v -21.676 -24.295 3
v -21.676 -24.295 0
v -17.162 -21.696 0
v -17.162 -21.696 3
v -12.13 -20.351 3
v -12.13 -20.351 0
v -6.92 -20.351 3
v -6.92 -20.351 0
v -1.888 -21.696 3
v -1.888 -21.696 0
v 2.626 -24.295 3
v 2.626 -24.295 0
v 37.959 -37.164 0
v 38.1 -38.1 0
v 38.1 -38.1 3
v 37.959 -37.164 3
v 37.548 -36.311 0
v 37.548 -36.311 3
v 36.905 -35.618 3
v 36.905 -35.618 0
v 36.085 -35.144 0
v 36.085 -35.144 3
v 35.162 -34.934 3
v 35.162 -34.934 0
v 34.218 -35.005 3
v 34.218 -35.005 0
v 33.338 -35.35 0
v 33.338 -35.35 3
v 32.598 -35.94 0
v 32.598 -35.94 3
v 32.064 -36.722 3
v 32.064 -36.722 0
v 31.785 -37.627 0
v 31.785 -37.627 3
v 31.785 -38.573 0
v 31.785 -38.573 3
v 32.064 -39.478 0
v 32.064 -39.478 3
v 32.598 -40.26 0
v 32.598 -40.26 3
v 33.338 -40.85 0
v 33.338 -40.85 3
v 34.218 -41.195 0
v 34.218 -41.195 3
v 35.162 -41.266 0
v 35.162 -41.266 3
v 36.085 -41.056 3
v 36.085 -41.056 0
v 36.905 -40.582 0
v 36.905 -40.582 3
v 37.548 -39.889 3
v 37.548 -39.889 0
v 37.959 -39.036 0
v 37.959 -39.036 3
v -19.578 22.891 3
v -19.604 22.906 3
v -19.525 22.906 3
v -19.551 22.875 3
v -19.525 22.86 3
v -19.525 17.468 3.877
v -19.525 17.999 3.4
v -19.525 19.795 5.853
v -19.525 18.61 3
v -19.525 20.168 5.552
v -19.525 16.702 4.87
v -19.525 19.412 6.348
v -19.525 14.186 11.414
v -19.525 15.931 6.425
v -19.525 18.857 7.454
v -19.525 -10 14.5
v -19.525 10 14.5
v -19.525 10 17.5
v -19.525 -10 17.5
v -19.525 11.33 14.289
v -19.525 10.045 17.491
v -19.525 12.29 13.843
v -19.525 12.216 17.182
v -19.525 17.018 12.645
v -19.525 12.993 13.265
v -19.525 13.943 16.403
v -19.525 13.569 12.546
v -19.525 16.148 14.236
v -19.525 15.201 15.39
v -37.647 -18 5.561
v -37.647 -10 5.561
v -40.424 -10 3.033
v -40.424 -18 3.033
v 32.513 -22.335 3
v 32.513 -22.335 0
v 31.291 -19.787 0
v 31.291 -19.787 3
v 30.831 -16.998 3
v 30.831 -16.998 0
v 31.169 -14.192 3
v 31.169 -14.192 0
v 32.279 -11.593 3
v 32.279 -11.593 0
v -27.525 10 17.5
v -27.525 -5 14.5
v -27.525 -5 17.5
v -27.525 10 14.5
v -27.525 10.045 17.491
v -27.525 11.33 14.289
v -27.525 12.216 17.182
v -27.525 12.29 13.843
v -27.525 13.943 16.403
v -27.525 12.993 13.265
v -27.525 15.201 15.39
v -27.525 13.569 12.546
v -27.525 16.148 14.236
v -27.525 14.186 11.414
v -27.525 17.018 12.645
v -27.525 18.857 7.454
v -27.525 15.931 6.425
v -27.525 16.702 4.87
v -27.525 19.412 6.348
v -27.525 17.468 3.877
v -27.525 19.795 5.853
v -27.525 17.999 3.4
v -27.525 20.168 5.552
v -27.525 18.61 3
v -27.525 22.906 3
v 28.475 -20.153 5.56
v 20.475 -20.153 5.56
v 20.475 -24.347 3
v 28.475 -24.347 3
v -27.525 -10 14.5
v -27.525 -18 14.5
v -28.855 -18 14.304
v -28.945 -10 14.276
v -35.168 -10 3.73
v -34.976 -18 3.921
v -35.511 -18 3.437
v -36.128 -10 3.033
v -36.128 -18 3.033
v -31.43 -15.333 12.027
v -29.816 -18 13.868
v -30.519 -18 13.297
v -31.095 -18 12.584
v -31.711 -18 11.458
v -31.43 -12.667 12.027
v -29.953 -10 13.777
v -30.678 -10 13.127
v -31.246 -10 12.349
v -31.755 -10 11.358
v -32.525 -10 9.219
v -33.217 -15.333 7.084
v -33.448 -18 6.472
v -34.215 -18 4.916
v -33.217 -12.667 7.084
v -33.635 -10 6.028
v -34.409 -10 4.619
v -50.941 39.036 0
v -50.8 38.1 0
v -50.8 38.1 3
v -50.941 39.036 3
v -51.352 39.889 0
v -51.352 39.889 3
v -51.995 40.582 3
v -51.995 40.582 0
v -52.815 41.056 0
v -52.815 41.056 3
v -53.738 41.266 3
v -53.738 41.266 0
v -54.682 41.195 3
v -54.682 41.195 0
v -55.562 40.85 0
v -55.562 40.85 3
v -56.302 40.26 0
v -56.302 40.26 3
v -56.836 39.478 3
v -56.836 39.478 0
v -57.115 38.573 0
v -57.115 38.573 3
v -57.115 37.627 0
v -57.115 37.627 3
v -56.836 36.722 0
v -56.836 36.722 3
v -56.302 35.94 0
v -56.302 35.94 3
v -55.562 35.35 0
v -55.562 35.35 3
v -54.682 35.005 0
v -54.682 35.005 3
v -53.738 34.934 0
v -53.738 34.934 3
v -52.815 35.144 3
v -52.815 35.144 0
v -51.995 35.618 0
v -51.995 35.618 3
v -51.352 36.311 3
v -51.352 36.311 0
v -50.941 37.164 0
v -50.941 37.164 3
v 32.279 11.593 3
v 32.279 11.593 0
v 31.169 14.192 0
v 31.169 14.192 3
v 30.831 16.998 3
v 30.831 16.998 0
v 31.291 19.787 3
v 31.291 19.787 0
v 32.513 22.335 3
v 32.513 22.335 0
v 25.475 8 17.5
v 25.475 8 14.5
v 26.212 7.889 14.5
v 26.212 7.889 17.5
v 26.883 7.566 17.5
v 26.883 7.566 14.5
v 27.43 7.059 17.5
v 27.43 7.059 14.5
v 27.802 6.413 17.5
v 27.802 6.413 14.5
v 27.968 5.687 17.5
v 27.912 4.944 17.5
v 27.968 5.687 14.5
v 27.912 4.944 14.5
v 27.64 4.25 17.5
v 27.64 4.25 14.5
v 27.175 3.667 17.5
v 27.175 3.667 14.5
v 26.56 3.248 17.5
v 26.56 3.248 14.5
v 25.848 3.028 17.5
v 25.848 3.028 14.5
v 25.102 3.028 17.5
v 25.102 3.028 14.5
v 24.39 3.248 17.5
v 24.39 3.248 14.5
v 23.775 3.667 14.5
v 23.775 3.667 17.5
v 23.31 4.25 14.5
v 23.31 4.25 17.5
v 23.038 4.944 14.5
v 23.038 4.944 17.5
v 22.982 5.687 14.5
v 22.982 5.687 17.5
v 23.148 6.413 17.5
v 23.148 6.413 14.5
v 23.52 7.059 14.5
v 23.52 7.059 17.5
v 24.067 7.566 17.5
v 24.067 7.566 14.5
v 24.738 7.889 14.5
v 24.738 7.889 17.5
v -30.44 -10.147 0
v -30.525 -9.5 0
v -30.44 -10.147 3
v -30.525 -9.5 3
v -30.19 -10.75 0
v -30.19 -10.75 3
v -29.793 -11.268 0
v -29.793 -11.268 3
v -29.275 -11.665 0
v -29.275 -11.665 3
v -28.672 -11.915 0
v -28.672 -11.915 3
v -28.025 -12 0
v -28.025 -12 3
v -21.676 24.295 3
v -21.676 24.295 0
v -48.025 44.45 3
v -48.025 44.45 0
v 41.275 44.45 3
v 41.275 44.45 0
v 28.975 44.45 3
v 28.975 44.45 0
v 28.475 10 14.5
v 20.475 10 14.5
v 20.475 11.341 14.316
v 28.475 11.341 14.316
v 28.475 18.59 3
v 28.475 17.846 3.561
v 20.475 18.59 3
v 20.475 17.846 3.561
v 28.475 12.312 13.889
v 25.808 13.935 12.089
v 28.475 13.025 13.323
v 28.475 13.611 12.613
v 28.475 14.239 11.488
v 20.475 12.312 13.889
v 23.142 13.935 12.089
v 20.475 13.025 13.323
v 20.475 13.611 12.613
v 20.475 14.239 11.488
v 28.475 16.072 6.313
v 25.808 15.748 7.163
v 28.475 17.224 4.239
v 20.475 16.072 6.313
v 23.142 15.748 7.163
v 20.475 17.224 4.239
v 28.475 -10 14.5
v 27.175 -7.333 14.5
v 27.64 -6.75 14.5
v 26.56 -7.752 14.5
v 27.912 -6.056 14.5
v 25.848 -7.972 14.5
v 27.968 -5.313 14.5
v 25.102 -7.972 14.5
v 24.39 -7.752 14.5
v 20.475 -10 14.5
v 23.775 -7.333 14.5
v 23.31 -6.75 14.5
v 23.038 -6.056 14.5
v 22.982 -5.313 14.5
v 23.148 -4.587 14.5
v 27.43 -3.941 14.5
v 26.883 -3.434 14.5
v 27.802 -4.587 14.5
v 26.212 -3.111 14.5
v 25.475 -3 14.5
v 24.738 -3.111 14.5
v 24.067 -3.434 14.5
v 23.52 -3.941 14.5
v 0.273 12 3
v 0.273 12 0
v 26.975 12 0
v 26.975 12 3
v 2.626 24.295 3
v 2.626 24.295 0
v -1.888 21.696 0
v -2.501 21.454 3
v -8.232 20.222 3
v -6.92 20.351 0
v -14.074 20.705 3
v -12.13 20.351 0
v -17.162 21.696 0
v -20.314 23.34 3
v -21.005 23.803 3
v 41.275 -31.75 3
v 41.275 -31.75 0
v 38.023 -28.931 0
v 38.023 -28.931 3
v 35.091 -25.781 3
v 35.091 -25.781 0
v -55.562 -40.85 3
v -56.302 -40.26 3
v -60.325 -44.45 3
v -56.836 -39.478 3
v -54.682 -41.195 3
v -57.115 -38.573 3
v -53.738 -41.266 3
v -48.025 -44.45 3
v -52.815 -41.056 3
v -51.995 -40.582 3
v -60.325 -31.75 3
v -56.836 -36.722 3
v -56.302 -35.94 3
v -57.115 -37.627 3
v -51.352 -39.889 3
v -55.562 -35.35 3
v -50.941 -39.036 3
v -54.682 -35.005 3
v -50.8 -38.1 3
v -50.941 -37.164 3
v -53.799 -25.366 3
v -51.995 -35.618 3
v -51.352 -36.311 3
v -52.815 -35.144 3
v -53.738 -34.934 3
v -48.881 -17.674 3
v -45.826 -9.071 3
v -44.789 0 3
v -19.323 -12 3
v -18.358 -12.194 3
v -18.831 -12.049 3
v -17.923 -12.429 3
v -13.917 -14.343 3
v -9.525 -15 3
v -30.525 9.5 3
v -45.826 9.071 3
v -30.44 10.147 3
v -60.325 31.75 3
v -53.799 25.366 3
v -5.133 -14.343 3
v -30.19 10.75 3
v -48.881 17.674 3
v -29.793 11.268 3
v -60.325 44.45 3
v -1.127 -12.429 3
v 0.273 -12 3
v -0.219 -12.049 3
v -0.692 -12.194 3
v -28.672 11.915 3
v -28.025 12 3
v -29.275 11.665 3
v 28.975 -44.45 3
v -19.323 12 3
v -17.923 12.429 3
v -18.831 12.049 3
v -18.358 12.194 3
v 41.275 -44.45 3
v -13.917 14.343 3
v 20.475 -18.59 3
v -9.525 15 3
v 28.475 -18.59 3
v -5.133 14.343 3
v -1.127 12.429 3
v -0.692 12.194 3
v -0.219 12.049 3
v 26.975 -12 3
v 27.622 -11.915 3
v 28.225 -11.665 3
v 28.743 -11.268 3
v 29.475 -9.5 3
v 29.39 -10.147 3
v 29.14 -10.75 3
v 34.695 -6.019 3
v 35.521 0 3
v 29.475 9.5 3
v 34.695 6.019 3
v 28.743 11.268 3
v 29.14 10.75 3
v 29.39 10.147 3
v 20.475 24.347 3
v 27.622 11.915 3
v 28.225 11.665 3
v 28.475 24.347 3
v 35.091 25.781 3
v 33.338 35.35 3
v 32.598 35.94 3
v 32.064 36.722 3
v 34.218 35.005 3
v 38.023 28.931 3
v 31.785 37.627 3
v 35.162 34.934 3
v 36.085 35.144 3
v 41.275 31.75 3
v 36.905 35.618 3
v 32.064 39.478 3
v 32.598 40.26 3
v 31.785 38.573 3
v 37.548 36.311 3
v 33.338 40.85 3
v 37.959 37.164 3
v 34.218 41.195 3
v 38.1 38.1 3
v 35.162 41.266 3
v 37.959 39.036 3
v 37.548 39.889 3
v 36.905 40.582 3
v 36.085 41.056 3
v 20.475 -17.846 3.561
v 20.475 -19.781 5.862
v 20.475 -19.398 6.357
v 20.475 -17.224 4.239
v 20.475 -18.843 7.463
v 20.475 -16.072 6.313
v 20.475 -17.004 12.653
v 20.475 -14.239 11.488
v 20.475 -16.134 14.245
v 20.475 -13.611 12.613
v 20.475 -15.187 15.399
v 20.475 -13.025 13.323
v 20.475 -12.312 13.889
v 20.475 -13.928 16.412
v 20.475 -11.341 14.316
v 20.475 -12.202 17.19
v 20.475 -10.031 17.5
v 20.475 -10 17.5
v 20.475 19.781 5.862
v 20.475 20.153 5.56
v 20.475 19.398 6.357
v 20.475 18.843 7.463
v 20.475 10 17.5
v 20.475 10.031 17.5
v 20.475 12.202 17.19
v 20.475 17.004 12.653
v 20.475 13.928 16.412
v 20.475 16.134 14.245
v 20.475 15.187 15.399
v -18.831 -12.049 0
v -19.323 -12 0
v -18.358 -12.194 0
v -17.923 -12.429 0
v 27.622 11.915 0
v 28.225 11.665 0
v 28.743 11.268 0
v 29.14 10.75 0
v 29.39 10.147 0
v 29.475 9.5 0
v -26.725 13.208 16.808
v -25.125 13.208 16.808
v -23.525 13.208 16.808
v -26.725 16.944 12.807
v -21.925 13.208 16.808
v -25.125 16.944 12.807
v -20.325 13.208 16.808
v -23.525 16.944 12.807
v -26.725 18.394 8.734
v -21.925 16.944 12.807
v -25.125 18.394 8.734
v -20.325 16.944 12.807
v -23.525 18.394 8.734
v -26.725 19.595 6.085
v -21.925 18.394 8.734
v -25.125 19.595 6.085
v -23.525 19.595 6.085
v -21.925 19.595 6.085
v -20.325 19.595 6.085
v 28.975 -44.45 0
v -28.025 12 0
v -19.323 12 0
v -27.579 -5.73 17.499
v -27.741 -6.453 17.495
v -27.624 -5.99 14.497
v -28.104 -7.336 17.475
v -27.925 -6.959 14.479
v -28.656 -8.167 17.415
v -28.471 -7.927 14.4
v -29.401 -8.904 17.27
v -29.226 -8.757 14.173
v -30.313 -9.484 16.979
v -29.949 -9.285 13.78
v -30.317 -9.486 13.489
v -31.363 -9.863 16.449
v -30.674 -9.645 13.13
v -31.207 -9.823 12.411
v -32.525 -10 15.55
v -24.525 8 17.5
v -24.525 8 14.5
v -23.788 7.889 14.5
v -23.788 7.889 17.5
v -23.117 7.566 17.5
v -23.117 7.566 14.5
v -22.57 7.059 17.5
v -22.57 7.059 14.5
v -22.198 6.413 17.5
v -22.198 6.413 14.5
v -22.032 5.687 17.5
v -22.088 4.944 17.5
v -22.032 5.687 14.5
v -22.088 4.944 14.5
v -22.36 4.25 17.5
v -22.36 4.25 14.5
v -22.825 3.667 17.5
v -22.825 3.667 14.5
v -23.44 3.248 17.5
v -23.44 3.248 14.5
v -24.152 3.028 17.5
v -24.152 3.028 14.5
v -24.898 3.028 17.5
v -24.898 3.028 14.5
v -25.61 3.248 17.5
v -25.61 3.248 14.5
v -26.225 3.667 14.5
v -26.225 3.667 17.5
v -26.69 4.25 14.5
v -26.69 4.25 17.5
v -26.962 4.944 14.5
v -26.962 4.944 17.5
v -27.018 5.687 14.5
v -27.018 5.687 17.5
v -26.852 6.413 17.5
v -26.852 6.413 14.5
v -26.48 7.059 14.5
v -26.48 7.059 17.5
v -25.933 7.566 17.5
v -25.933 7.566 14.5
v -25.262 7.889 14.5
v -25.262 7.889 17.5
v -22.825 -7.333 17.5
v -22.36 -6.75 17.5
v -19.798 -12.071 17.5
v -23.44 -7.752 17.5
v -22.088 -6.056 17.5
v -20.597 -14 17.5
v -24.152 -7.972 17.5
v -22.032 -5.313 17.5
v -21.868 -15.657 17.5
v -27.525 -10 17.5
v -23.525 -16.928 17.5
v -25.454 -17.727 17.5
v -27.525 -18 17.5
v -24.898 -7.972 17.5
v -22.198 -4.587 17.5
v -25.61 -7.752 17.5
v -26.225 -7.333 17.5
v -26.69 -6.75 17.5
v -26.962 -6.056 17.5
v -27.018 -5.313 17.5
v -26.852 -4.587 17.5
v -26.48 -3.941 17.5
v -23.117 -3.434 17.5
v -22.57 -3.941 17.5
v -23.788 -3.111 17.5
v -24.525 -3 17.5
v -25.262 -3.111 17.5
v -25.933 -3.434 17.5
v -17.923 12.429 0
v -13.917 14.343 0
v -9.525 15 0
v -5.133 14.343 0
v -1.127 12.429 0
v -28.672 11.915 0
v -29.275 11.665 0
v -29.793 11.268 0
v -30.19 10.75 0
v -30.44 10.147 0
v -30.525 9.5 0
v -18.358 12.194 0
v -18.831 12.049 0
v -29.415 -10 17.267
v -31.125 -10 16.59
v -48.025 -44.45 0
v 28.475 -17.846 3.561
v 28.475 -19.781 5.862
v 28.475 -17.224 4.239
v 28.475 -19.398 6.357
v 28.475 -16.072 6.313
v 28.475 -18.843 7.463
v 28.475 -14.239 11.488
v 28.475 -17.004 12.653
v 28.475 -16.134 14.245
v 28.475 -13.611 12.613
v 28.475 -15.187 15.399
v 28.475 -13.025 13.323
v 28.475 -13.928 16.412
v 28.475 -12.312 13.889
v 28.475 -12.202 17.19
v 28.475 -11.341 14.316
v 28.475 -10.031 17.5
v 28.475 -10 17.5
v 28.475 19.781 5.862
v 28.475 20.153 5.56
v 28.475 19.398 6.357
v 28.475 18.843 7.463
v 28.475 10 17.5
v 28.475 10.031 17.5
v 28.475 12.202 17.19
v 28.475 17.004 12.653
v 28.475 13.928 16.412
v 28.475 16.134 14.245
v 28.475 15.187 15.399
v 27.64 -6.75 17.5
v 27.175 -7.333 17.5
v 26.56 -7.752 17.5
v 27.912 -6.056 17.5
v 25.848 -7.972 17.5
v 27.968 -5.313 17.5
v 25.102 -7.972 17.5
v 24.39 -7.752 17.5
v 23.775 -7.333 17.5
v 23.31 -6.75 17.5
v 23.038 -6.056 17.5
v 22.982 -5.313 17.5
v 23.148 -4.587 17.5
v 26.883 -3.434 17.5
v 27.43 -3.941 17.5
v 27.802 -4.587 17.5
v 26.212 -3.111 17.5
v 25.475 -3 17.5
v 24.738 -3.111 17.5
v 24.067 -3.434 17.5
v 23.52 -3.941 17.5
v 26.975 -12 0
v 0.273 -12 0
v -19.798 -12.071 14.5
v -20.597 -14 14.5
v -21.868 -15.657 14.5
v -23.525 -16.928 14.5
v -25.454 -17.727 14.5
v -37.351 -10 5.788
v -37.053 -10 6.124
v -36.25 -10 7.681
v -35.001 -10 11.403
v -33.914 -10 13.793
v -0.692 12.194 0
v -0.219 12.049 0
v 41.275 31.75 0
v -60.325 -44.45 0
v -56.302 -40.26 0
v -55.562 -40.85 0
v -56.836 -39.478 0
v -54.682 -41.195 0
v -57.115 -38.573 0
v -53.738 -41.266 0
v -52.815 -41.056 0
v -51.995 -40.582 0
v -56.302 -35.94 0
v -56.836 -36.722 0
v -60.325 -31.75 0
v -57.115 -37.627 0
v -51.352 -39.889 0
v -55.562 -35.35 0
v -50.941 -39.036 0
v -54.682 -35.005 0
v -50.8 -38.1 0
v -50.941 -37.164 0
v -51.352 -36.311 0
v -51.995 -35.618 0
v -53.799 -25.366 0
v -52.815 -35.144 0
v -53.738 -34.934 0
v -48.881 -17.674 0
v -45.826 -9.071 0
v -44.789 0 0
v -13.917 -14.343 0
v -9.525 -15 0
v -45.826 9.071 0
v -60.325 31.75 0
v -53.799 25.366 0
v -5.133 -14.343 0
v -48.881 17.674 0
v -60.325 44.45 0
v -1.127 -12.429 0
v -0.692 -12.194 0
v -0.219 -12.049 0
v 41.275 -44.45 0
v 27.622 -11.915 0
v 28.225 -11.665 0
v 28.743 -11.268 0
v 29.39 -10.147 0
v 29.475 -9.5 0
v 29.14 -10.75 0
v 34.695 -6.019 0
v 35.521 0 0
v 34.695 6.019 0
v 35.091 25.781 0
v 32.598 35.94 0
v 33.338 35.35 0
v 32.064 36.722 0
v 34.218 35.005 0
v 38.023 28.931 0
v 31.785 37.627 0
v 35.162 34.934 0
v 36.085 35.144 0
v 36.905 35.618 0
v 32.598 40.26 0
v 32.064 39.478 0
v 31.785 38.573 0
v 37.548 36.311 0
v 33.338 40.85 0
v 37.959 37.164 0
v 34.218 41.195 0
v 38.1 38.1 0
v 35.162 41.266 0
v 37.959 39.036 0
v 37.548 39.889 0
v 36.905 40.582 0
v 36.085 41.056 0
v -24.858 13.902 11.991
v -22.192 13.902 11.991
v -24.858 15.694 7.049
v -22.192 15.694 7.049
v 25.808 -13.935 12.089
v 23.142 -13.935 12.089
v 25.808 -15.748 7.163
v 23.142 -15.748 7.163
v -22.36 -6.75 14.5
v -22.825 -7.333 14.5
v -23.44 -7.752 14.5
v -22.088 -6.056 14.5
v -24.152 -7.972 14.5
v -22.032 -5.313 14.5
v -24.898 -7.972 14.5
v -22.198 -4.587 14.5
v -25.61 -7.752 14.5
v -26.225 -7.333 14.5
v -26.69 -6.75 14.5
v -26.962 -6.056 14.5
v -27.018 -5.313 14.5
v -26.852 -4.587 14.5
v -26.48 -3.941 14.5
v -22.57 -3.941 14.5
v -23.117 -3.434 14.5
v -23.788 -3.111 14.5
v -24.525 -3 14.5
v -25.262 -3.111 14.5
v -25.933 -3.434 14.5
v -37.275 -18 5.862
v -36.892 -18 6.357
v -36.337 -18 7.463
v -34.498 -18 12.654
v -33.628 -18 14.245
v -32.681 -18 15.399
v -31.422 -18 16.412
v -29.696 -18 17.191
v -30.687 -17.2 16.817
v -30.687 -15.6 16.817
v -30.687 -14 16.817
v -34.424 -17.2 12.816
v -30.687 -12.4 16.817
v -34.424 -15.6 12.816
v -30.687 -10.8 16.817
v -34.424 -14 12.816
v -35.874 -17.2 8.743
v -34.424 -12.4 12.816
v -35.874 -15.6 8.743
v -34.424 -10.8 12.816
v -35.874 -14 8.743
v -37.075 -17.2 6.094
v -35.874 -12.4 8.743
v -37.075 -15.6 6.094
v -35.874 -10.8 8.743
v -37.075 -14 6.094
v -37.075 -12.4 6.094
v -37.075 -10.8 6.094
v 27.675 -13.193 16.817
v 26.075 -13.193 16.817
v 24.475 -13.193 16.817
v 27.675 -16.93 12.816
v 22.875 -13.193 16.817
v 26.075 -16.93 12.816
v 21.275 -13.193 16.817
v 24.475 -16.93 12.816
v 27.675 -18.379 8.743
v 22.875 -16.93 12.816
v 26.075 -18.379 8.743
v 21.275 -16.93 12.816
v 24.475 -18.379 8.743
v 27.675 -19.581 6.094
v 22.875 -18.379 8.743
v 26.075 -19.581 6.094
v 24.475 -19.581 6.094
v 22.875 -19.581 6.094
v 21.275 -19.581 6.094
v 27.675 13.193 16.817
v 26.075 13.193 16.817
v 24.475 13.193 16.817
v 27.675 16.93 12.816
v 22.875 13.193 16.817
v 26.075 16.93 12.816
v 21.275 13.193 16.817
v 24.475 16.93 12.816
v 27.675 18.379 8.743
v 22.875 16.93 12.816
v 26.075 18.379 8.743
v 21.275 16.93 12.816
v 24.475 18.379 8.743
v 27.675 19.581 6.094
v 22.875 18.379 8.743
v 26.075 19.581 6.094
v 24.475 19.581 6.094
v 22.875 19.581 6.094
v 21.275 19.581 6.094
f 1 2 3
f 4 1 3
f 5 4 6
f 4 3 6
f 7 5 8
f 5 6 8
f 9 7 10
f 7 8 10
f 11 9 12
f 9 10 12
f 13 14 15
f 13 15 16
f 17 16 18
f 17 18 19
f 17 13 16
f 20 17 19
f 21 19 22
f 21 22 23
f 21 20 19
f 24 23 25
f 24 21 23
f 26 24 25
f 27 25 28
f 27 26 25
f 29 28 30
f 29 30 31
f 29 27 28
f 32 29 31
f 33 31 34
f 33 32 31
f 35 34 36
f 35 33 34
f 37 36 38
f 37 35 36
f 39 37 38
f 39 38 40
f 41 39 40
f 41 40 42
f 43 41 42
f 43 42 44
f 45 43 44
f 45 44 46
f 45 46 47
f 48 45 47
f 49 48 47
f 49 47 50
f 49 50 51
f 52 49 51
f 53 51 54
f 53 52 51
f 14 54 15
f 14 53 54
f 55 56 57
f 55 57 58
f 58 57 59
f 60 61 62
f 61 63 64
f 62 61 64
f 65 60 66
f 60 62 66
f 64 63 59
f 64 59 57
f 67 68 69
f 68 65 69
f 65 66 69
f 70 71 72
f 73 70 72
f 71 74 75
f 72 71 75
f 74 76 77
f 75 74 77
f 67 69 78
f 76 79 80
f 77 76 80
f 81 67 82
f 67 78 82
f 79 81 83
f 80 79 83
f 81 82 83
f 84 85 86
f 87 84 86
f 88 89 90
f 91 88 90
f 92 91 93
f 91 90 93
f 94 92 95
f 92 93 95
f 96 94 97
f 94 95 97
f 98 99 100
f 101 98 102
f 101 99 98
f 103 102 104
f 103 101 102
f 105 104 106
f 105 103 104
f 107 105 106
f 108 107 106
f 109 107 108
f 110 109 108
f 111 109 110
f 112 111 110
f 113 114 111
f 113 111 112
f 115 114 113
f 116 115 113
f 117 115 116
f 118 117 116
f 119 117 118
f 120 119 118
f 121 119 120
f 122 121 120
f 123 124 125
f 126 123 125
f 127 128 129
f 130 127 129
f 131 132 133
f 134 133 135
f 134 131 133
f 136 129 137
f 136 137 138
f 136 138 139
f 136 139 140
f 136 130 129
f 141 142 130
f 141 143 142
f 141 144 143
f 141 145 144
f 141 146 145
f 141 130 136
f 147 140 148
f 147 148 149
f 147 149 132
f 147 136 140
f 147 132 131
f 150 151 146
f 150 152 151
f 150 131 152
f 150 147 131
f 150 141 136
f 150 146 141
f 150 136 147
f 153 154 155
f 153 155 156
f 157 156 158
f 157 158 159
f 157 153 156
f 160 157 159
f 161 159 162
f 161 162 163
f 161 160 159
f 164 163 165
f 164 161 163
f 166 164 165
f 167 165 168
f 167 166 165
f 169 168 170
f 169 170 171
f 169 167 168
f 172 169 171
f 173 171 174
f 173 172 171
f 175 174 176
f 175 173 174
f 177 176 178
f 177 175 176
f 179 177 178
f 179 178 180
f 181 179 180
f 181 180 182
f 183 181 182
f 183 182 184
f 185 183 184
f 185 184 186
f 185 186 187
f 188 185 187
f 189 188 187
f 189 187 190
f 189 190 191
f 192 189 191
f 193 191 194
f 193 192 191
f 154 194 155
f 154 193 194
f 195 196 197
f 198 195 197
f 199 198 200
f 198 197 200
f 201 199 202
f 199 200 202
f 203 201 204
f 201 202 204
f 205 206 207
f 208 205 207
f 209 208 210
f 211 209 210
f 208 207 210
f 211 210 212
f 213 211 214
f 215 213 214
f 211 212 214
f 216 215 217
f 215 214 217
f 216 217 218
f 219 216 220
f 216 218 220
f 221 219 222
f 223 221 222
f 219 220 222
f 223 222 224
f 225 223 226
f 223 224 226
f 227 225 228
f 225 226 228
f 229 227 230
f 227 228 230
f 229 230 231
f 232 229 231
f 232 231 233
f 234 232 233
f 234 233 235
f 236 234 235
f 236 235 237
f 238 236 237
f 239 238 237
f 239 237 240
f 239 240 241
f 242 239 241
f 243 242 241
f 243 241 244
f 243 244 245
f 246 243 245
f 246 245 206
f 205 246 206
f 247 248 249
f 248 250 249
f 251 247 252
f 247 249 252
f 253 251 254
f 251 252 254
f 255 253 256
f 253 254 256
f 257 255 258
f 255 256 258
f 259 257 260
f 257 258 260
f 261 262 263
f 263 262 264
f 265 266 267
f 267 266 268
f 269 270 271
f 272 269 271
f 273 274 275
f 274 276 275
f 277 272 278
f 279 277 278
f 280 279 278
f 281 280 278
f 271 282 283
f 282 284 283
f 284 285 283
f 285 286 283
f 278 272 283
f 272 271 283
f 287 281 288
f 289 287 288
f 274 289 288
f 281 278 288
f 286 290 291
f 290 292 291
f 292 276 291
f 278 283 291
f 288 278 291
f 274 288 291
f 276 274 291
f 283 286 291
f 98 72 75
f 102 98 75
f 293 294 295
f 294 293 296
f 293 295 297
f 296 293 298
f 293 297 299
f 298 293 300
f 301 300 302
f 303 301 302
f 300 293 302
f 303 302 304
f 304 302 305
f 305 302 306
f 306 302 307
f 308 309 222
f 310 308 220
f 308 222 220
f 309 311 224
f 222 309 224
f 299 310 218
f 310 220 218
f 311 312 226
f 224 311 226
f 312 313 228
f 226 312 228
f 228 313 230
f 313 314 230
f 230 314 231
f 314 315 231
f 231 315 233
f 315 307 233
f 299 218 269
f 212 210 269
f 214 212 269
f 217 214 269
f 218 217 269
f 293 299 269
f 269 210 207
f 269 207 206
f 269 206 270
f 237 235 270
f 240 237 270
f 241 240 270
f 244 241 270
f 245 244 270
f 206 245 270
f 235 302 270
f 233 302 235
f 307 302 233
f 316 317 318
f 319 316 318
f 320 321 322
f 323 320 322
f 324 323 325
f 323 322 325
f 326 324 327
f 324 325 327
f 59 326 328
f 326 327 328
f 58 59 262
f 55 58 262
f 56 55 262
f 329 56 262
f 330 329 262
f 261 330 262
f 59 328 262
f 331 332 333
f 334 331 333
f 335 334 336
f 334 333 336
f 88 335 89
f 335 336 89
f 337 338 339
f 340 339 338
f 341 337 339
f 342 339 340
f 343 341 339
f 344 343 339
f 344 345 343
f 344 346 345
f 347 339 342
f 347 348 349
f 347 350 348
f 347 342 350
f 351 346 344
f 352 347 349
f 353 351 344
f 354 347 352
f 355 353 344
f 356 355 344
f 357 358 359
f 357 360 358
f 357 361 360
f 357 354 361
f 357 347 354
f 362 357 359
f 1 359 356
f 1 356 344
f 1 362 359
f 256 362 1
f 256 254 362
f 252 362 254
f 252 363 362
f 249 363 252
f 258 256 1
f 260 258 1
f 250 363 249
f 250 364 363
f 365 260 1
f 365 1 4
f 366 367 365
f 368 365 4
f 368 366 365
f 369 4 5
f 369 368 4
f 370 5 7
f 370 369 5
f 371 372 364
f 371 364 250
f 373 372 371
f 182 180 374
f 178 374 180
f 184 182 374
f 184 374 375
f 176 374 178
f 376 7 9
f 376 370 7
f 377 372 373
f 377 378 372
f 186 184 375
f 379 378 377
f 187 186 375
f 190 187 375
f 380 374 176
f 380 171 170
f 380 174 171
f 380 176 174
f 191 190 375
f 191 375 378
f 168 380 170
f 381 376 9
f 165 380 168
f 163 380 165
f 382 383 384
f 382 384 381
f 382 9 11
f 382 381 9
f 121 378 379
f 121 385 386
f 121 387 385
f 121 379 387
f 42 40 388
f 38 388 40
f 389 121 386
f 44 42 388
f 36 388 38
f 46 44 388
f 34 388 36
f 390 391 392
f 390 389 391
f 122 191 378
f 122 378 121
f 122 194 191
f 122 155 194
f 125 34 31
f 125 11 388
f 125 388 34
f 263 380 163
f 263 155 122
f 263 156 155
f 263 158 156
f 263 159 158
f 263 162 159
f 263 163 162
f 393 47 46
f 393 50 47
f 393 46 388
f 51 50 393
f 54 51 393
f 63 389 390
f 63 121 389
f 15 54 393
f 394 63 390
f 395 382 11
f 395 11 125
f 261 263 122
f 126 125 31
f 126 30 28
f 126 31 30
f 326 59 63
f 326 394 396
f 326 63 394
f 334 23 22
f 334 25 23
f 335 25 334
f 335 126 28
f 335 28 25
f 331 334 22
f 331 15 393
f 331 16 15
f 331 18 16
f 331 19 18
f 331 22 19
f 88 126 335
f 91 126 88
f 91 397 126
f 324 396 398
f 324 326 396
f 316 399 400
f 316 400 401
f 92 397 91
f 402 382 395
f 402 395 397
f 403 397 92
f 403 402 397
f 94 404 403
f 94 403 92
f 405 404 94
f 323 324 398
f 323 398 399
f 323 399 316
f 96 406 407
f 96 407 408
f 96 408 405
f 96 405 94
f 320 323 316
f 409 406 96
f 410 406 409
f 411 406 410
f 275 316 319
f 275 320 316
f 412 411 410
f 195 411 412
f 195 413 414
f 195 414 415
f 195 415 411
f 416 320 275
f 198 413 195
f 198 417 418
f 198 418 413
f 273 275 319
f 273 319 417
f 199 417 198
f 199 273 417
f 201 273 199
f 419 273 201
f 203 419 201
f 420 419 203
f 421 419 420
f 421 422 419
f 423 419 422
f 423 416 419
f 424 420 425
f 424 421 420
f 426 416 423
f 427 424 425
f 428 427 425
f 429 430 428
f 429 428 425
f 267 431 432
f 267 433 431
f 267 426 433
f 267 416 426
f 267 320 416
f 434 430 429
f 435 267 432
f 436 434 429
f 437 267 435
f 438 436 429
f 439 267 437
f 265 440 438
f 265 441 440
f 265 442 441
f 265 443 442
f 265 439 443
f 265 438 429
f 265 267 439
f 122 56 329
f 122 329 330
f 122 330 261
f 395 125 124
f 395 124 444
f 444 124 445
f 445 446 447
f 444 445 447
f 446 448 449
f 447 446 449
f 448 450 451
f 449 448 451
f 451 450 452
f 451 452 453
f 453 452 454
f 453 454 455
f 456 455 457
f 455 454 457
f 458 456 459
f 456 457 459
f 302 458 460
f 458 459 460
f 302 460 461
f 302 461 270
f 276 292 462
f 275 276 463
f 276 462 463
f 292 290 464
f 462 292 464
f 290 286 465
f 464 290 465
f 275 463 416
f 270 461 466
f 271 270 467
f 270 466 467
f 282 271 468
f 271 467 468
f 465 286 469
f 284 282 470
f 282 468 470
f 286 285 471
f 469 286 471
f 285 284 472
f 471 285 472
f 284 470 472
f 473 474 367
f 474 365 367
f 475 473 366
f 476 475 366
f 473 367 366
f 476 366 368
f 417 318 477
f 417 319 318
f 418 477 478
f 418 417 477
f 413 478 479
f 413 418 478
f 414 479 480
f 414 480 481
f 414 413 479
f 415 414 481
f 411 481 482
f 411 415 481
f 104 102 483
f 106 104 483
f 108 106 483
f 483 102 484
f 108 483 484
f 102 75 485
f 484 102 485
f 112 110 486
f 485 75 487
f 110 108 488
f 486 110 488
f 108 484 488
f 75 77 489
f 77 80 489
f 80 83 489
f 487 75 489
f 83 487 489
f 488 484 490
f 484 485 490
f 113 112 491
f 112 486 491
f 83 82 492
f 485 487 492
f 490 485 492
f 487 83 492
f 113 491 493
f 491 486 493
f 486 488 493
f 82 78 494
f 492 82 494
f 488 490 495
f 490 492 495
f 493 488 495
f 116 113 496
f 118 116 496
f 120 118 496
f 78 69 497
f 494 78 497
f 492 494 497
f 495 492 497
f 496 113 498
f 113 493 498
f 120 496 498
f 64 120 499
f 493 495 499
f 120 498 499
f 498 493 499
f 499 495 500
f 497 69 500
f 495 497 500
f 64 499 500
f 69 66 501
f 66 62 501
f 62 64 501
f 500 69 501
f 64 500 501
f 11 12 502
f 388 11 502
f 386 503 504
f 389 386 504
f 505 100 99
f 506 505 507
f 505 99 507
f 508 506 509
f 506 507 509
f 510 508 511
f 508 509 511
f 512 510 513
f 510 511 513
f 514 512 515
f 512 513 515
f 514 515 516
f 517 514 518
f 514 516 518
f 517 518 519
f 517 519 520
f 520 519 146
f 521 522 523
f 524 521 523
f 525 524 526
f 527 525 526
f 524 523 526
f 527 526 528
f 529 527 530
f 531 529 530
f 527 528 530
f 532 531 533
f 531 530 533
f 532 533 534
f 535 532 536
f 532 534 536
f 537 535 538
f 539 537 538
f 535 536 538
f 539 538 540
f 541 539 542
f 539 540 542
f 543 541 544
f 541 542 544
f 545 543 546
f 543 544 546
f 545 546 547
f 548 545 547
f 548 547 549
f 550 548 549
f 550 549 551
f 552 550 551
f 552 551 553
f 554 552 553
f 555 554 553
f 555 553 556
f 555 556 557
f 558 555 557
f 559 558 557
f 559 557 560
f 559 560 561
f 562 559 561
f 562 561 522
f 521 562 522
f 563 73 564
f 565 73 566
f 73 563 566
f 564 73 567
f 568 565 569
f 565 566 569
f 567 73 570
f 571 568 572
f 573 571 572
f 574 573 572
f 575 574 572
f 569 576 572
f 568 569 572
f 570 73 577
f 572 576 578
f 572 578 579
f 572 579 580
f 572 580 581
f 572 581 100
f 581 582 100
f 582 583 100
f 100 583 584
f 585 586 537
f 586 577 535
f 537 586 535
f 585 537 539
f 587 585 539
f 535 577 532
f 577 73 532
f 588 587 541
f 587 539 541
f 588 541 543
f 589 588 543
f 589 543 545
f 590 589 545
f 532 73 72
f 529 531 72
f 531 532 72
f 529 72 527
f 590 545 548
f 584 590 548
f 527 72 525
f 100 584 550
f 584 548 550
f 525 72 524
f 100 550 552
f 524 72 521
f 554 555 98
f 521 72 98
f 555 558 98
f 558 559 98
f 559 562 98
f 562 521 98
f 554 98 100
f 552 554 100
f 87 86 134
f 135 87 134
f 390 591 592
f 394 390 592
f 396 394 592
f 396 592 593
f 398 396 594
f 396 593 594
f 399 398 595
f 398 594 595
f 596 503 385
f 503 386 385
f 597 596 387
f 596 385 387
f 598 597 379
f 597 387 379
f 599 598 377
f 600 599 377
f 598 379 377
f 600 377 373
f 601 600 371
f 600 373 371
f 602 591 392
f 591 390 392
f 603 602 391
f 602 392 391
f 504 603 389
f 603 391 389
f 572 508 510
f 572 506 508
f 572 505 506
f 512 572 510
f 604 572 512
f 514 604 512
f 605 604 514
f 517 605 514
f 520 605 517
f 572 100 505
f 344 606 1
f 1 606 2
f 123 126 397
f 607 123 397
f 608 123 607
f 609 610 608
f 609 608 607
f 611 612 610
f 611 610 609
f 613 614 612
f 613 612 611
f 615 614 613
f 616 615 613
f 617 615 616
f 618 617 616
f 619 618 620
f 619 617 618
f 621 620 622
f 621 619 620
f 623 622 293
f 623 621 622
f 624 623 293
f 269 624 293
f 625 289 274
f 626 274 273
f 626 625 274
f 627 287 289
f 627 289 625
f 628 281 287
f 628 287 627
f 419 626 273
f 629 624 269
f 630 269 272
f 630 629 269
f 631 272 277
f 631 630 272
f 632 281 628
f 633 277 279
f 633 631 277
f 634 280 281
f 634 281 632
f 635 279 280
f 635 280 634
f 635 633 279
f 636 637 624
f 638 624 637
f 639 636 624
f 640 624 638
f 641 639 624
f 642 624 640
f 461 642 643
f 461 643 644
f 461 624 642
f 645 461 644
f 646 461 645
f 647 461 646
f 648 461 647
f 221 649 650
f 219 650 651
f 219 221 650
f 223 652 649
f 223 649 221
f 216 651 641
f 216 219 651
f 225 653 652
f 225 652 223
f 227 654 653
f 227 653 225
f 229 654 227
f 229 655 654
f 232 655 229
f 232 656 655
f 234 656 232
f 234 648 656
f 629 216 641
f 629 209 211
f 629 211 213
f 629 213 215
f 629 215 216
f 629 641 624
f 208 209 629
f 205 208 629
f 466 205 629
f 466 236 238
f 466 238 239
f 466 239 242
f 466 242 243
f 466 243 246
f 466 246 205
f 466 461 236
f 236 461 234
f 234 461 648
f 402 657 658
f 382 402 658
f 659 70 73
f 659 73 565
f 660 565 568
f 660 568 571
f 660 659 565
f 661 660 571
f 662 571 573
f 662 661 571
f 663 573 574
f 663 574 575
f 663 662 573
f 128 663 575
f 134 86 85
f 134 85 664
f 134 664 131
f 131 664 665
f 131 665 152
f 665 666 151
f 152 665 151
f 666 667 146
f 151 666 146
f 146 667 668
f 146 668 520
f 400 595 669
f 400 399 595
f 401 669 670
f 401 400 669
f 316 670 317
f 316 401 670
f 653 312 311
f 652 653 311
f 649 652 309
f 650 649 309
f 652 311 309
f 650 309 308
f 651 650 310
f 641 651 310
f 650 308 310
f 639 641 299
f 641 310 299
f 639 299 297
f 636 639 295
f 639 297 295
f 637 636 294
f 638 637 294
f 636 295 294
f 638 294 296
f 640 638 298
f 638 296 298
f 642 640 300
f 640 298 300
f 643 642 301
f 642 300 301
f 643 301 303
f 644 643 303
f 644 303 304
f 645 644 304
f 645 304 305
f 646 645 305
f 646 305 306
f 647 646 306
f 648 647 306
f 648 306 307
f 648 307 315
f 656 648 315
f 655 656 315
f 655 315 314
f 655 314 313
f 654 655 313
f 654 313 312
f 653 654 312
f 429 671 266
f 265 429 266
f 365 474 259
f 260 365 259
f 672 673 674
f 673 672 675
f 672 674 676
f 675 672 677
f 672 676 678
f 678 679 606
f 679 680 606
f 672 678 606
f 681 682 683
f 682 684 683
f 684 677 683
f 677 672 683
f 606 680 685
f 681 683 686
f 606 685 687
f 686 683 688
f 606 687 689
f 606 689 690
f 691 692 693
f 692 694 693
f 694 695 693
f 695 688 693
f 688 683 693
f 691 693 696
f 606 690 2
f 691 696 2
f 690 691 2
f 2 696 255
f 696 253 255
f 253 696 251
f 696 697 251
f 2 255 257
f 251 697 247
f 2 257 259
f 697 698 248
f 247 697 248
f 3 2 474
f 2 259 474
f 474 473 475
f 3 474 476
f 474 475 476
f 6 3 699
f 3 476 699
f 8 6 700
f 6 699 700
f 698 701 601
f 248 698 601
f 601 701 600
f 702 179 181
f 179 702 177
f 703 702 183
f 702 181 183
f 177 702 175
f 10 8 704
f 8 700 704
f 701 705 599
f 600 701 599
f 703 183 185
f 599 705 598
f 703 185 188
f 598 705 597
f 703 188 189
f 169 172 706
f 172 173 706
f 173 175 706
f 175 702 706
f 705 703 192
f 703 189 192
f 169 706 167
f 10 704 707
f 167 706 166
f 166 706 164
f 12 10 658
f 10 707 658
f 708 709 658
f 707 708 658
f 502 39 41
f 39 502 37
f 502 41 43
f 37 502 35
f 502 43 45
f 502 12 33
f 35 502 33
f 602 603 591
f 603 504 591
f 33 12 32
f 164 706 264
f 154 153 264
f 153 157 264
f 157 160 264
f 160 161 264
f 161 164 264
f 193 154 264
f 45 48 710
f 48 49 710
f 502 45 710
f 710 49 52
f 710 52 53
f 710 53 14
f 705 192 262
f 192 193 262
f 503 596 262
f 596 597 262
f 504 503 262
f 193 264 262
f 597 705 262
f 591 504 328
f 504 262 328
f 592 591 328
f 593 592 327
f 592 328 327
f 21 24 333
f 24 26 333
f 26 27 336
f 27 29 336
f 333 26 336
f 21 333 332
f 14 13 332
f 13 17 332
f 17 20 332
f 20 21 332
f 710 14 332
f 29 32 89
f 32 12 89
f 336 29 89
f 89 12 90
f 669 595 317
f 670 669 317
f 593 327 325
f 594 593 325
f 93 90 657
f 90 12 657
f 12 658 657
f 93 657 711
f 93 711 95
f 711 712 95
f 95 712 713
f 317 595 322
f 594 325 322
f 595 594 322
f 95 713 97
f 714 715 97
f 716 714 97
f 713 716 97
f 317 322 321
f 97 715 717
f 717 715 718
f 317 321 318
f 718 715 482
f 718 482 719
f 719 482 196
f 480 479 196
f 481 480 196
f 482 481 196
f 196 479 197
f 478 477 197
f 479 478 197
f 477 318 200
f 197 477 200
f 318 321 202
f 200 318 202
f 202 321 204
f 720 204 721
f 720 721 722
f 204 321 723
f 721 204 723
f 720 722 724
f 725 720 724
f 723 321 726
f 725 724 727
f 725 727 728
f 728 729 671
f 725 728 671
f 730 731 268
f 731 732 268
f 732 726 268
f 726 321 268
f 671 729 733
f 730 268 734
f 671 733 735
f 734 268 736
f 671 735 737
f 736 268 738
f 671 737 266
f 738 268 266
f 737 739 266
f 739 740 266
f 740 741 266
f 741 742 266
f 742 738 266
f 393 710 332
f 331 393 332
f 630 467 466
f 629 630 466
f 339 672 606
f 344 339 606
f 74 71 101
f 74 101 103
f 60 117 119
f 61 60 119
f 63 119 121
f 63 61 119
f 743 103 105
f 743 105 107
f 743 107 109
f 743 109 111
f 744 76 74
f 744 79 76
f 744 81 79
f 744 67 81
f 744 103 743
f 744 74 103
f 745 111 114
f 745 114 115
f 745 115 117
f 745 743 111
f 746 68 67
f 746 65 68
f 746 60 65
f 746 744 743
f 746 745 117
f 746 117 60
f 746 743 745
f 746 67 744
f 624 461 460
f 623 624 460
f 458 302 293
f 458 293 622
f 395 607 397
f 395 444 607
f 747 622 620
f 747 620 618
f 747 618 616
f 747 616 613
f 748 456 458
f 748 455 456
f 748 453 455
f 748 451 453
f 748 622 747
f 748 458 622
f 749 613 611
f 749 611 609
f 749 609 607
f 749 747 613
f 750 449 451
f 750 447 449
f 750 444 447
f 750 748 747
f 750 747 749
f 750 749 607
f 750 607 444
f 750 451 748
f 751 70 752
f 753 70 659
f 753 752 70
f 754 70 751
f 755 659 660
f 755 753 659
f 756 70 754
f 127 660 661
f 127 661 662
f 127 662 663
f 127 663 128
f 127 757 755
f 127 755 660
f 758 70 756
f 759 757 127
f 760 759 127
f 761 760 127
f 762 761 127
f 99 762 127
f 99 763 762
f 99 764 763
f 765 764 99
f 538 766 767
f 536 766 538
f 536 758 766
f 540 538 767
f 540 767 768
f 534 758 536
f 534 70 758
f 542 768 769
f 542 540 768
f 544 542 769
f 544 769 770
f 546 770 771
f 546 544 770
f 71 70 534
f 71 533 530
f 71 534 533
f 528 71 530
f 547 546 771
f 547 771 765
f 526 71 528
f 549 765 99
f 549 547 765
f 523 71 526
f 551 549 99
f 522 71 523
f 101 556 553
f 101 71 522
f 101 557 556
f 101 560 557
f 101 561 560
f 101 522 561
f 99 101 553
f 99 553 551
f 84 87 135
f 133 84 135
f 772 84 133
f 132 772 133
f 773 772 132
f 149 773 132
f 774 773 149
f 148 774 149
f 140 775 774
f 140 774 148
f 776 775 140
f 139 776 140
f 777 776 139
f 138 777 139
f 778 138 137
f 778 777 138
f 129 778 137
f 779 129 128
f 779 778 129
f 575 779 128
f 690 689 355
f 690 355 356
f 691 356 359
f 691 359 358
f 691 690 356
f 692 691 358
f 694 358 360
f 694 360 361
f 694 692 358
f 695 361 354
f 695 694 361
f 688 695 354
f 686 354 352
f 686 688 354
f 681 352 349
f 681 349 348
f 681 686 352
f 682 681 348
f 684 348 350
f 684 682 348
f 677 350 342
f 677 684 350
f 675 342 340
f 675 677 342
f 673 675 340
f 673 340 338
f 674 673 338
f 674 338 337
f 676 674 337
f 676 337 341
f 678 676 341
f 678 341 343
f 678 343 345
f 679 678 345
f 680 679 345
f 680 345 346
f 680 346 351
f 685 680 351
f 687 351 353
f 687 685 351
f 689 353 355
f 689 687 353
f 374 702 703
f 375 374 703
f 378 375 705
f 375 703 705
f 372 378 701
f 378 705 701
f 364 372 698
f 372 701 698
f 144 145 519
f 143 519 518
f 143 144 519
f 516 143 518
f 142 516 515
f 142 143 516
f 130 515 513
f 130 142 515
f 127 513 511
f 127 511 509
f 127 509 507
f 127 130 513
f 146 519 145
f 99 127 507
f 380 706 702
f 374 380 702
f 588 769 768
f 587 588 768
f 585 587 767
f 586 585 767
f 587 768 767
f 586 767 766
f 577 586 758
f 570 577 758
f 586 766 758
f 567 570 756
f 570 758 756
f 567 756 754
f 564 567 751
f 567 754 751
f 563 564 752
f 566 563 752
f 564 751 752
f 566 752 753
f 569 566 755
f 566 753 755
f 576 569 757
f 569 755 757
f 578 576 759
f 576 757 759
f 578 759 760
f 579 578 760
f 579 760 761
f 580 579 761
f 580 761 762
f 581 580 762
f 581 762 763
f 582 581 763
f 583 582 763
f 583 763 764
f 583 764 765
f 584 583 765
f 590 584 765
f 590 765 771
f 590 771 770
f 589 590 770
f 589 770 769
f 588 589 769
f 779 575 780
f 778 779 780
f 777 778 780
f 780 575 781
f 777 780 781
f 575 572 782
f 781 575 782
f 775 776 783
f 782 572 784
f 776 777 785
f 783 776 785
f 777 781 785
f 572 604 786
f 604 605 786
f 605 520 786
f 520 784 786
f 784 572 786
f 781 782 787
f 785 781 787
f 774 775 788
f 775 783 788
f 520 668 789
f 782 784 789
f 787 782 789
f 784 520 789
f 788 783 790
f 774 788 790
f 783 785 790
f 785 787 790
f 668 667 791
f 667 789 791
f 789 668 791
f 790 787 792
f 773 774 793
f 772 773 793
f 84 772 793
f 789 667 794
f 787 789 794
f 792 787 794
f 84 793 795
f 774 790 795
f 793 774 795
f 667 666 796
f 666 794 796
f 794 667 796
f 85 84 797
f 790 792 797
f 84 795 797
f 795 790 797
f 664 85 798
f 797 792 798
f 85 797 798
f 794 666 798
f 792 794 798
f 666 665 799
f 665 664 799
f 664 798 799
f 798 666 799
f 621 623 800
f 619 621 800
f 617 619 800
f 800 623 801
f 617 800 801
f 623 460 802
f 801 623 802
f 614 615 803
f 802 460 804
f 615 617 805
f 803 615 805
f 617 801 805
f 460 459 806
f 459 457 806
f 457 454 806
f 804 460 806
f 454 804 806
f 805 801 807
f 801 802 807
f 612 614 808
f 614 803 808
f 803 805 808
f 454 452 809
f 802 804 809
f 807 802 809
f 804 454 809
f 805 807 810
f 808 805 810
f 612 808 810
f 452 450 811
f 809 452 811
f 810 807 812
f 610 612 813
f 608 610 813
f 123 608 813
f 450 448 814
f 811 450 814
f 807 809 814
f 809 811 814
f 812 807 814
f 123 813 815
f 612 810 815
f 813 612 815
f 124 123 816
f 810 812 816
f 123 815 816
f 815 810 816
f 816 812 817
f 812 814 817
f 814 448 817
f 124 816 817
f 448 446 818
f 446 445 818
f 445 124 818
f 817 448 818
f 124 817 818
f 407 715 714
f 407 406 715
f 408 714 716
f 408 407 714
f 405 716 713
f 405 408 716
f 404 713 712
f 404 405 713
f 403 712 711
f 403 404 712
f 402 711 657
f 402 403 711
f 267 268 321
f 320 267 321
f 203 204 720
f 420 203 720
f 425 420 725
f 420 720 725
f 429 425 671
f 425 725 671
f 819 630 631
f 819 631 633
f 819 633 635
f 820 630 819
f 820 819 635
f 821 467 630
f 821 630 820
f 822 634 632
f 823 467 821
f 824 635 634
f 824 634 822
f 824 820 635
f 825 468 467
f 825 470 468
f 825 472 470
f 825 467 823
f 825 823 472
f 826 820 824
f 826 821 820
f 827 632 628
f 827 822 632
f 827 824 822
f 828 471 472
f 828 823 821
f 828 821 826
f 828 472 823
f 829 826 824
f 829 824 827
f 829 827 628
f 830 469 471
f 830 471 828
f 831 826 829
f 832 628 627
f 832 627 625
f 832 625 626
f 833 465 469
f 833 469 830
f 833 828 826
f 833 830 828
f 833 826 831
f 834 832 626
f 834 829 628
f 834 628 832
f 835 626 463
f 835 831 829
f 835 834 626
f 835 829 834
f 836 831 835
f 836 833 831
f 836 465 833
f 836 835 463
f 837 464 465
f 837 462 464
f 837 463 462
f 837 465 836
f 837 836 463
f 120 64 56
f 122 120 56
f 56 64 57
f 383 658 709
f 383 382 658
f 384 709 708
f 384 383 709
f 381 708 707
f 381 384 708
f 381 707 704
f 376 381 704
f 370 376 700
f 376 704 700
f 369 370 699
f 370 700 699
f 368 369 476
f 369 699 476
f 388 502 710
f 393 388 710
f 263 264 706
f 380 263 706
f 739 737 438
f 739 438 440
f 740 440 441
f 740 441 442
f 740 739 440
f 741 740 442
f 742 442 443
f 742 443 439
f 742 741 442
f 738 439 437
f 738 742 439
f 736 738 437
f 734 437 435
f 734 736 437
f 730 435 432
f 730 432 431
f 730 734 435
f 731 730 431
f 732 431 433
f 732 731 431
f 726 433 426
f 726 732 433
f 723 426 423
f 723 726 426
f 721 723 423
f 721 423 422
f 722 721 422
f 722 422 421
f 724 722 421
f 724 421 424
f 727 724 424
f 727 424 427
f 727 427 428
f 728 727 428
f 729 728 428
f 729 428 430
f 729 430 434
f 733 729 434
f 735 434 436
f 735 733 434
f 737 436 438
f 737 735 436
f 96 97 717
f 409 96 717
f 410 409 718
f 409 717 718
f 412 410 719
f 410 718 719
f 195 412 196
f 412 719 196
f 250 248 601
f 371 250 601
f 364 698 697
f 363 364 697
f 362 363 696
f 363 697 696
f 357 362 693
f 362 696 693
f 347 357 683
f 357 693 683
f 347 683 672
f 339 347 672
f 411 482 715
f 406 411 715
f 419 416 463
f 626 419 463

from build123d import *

# Parameters (mm, degrees)
SKETCH1_R           = 3.175
BOSS_EXTRUDE1_DEPTH = 3
SKETCH2_W           = 20
SKETCH2_H           = 3
BOSS_EXTRUDE2_DEPTH = 8
SKETCH3_W           = 3
SKETCH3_H           = 10
BOSS_EXTRUDE3_DEPTH = 8
BOSS_EXTRUDE4_DEPTH = 3
BOSS_EXTRUDE5_DEPTH = 8
FILLET1_START       = 9.218775709
FILLET1_DEPTH       = 8.281224391
FILLET1_START_2     = -10
FILLET1_2_DEPTH     = 6
FILLET2_R           = 2.5
SKETCH6_R           = 2.5
CUT_EXTRUDE1_DEPTH  = 10


with BuildPart() as part:
    # Sketch1 → Boss-Extrude1 (new body)
    with BuildSketch(Plane.XY):
        with BuildLine():
            Line((-60.325, -31.75), (-60.325, -44.45))
            Line((-60.325, -44.45), (-48.025, -44.45))
            Line((-48.025, -44.45), (-21.676299295, -24.294954915))
            ThreePointArc((-21.676299295, -24.294954915), (-9.525, -20.180354672), (2.626299295, -24.294954915))
            Line((2.626299295, -24.294954915), (28.975, -44.45))
            Line((28.975, -44.45), (41.275, -44.45))
            Line((41.275, -44.45), (41.275, -31.75))
            ThreePointArc((41.275, -31.75), (36.515027492, -27.39513634), (32.512762317, -22.33509195))
            ThreePointArc((32.512762317, -22.33509195), (30.830682399, -16.998296592), (32.278938689, -11.593360767))
            ThreePointArc((32.278938689, -11.593360767), (35.521007508, 0), (32.278938689, 11.593360767))
            ThreePointArc((32.278938689, 11.593360767), (30.830682399, 16.998296592), (32.512762317, 22.33509195))
            ThreePointArc((32.512762317, 22.33509195), (36.515027492, 27.39513634), (41.275, 31.75))
            Line((41.275, 31.75), (41.275, 44.45))
            Line((41.275, 44.45), (28.975, 44.45))
            Line((28.975, 44.45), (2.626299295, 24.294954915))
            ThreePointArc((2.626299295, 24.294954915), (-9.525, 20.180354672), (-21.676299295, 24.294954915))
            Line((-21.676299295, 24.294954915), (-48.025, 44.45))
            Line((-48.025, 44.45), (-60.325, 44.45))
            Line((-60.325, 44.45), (-60.325, 31.75))
            ThreePointArc((-60.325, 31.75), (-48.881491961, 17.673557002), (-44.789364565, 0))
            ThreePointArc((-44.789364565, 0), (-48.881491961, -17.673557002), (-60.325, -31.75))
        make_face()
        with Locations((-53.975, -38.1)):
            Circle(SKETCH1_R, mode=Mode.SUBTRACT)
        with Locations((34.925, -38.1)):
            Circle(SKETCH1_R, mode=Mode.SUBTRACT)
        with Locations((-53.975, 38.1)):
            Circle(SKETCH1_R, mode=Mode.SUBTRACT)
        with BuildLine():
            Line((-18.525, -12), (-30.525, -12))
            Line((-30.525, -12), (-30.525, 12))
            Line((-30.525, 12), (-18.525, 12))
            ThreePointArc((-18.525, 12), (-9.525, 15), (-0.525, 12))
            Line((-0.525, 12), (29.475, 12))
            Line((29.475, 12), (29.475, -12))
            Line((29.475, -12), (-0.525, -12))
            ThreePointArc((-0.525, -12), (-9.525, -15), (-18.525, -12))
        make_face(mode=Mode.SUBTRACT)
        with Locations((34.925, 38.1)):
            Circle(SKETCH1_R, mode=Mode.SUBTRACT)
    extrude(amount=BOSS_EXTRUDE1_DEPTH)

    # Sketch2 → Boss-Extrude2 (add)
    with BuildSketch(Plane.YZ.offset(20.475)):
        with BuildLine():
            Line((10, 17.5), (10, 14.5))
            add(Edge.make_bspline(
                [(10, 14.5), (16.044635902, 14.437929649), (14.184736767, 5.689745318), (18.589920917, 3)],
                knots=[0, 0, 0, 0, 1, 1, 1, 1], degree=3))
            Line((18.589920917, 3), (24.346709493, 3))
            Line((24.346709493, 3), (20.153292557, 5.560443148))
            add(Edge.make_bspline(
                [(10.030804376, 17.499841844), (10.580284275, 17.494199418), (11.690825904, 17.381169352), (13.744868646, 16.699236551), (15.740064205, 15.05007217), (17.01264364, 12.797944804), (17.78675167, 10.651473672), (18.380074772, 8.685818255), (18.969741662, 7.060430969), (19.488563299, 6.172247499), (19.869226233, 5.760648886), (20.051080137, 5.622852657), (20.153292557, 5.560443148)],
                knots=[0, 0, 0, 0, 0.0625, 0.125, 0.25, 0.375, 0.5, 0.625, 0.75, 0.875, 0.9375, 1, 1, 1, 1], degree=3))
            Line((10.030804376, 17.499841844), (10, 17.5))
        make_face()
        with Locations((0, 16)):
            Rectangle(SKETCH2_W, SKETCH2_H)
        with BuildLine():
            add(Edge.make_bspline(
                [(-10, 14.5), (-16.044635902, 14.437929649), (-14.184736767, 5.689745318), (-18.589920917, 3)],
                knots=[0, 0, 0, 0, 1, 1, 1, 1], degree=3))
            Line((-10, 14.5), (-10, 17.5))
            Line((-10, 17.5), (-10.030804376, 17.499841844))
            add(Edge.make_bspline(
                [(-10.030804376, 17.499841844), (-10.580284275, 17.494199418), (-11.690825904, 17.381169352), (-13.744868646, 16.699236551), (-15.740064205, 15.05007217), (-17.01264364, 12.797944804), (-17.78675167, 10.651473672), (-18.380074772, 8.685818255), (-18.969741662, 7.060430969), (-19.488563299, 6.172247499), (-19.869226233, 5.760648886), (-20.051080137, 5.622852657), (-20.153292557, 5.560443148)],
                knots=[0, 0, 0, 0, 0.0625, 0.125, 0.25, 0.375, 0.5, 0.625, 0.75, 0.875, 0.9375, 1, 1, 1, 1], degree=3))
            Line((-20.153292557, 5.560443148), (-24.346709493, 3))
            Line((-24.346709493, 3), (-18.589920917, 3))
        make_face()
    extrude(amount=BOSS_EXTRUDE2_DEPTH)

    # Sketch3 → Boss-Extrude3 (add)
    with BuildSketch(Plane.ZY.offset(19.525)):
        with Locations((16, 5)):
            Rectangle(SKETCH3_W, SKETCH3_H)
        with Locations((16, -5)):
            Rectangle(SKETCH3_W, SKETCH3_H)
        with BuildLine():
            add(Edge.make_bspline(
                [(14.5, 10), (14.31563917, 16.035707977), (5.493486467, 14.05293238), (3, 18.609732698)],
                knots=[0, 0, 0, 0, 1, 1, 1, 1], degree=3))
            Line((14.5, 10), (17.5, 10))
            Line((17.5, 10), (17.491030171, 10.04523587))
            add(Edge.make_bspline(
                [(17.491030171, 10.04523587), (17.485387745, 10.594715769), (17.372357679, 11.705257398), (16.690424877, 13.75930014), (15.041260496, 15.754495699), (12.789133131, 17.027075134), (10.642661999, 17.801183164), (8.677006582, 18.394506266), (7.051619296, 18.984173156), (6.163435825, 19.502994793), (5.751837213, 19.883657727), (5.614040983, 20.065511631), (5.551631475, 20.167724051)],
                knots=[0, 0, 0, 0, 0.0625, 0.125, 0.25, 0.375, 0.5, 0.625, 0.75, 0.875, 0.9375, 1, 1, 1, 1], degree=3))
            Line((5.551631475, 20.167724051), (3, 22.905906895))
            Line((3, 22.905906895), (3, 18.609732698))
        make_face()
    extrude(amount=BOSS_EXTRUDE3_DEPTH)

    # Sketch4 → Boss-Extrude4 (add)
    with BuildSketch(Plane(origin=(0, 0, 14.5), x_dir=(-1, 0, 0), z_dir=(0, 0, -1))):
        with BuildLine():
            Line((27.525, -18), (27.525, -10))
            Line((27.525, -10), (19.525, -10))
            ThreePointArc((19.525, -10), (21.868145751, -15.656854249), (27.525, -18))
        make_face()
    extrude(amount=-BOSS_EXTRUDE4_DEPTH)

    # Sketch5 → Boss-Extrude5 (add)
    with BuildSketch(Plane.XZ.offset(10)):
        with BuildLine():
            Line((-37.647488181, 5.560601304), (-40.424026667, 3.033030687))
            Line((-40.424026667, 3.033030687), (-36.12785247, 3.033030687))
            add(Edge.make_bspline(
                [(-27.525, 14.5), (-33.57036544, 14.381422519), (-31.574084791, 5.518855921), (-36.12785247, 3.033030687)],
                knots=[0, 0, 0, 0, 1, 1, 1, 1], degree=3))
            Line((-27.525, 14.5), (-27.525, 17.5))
            add(Edge.make_bspline(
                [(-27.525, 17.5), (-28.074479899, 17.494357574), (-29.185021529, 17.381327508), (-31.23906427, 16.699394706), (-33.234259829, 15.050230325), (-34.506839264, 12.79810296), (-35.280947294, 10.651631828), (-35.874270396, 8.685976411), (-36.463937286, 7.060589125), (-36.982758923, 6.172405654), (-37.363421857, 5.760807042), (-37.545275761, 5.623010812), (-37.647488181, 5.560601304)],
                knots=[0, 0, 0, 0, 0.0625, 0.125, 0.25, 0.375, 0.5, 0.625, 0.75, 0.875, 0.9375, 1, 1, 1, 1], degree=3))
        make_face()
    extrude(amount=BOSS_EXTRUDE5_DEPTH)

    # Fillet1: read off the stored shape, not the designer's step
    # Fillet1 outline → Fillet1 (add)
    with BuildSketch(Plane.XY.offset(FILLET1_START)):
        with BuildLine():
            Line((-27.525, -10), (-27.525, -5))
            ThreePointArc((-27.525, -5), (-28.989466094, -8.535533906), (-32.525, -10))
            Line((-32.525, -10), (-27.525, -10))
        make_face()
    extrude(amount=FILLET1_DEPTH)

    # Fillet1 2 outline → Fillet1 2 (cut)
    with BuildSketch(Plane(origin=(0, 0, 0), x_dir=(1, 0, 0), z_dir=(0, 1, 0)).offset(FILLET1_START_2)):
        with BuildLine():
            Line((-32.525, -17.5000001), (-27.525, -17.5))
            add(Edge.make_bspline(
                [(-27.525, -17.5), (-28.074479899, -17.494357574), (-29.185021529, -17.381327508), (-30.968007207, -16.789384412), (-32.004283714, -16.043301537), (-32.525, -15.550477548)],
                knots=[0, 0, 0, 0, 0.0625, 0.125, 0.217009321, 0.217009321, 0.217009321, 0.217009321], degree=3))
            Line((-32.525, -15.550477548), (-32.525, -17.5000001))
        make_face()
        with BuildLine():
            Line((-27.525, -9.218775709), (-32.525000028, -9.218775718))
            add(Edge.make_bspline(
                [(-32.525000028, -9.218775718), (-31.668443392, -11.933356908), (-30.719340028, -14.437344269), (-27.525, -14.5)],
                knots=[0.47160514, 0.47160514, 0.47160514, 0.47160514, 1, 1, 1, 1], degree=3))
            Line((-27.525, -14.5), (-27.525, -9.218775709))
        make_face()
    extrude(amount=FILLET1_2_DEPTH, mode=Mode.SUBTRACT)

    # Fillet2
    fillet2_edges = [part.edges().sort_by_distance(p)[0] for p in [
        (-18.525, 12, 1.5),
        (-30.525, 12, 1.5),
        (-30.525, -12, 1.5),
        (-18.525, -12, 1.5),
        (-0.525, -12, 1.5),
        (29.475, -12, 1.5),
        (29.475, 12, 1.5),
        (-0.525, 12, 1.5),
    ]]
    fillet(fillet2_edges, radius=FILLET2_R)

    # Sketch6 → Cut-Extrude1 (cut)
    with BuildSketch(Plane(origin=(0, 0, 14.5), x_dir=(-1, 0, 0), z_dir=(0, 0, -1))):
        with Locations(Location((24.525, -5.5, 0), (0, 0, 90))):
            Circle(SKETCH6_R)
        with Locations(Location((24.525, 5.5, 0), (0, 0, 90))):
            Circle(SKETCH6_R)
        with Locations(Location((-25.475, -5.5, 0), (0, 0, 90))):
            Circle(SKETCH6_R)
        with Locations(Location((-25.475, 5.5, 0), (0, 0, 90))):
            Circle(SKETCH6_R)
    extrude(amount=-CUT_EXTRUDE1_DEPTH, mode=Mode.SUBTRACT)


solid = part.part
